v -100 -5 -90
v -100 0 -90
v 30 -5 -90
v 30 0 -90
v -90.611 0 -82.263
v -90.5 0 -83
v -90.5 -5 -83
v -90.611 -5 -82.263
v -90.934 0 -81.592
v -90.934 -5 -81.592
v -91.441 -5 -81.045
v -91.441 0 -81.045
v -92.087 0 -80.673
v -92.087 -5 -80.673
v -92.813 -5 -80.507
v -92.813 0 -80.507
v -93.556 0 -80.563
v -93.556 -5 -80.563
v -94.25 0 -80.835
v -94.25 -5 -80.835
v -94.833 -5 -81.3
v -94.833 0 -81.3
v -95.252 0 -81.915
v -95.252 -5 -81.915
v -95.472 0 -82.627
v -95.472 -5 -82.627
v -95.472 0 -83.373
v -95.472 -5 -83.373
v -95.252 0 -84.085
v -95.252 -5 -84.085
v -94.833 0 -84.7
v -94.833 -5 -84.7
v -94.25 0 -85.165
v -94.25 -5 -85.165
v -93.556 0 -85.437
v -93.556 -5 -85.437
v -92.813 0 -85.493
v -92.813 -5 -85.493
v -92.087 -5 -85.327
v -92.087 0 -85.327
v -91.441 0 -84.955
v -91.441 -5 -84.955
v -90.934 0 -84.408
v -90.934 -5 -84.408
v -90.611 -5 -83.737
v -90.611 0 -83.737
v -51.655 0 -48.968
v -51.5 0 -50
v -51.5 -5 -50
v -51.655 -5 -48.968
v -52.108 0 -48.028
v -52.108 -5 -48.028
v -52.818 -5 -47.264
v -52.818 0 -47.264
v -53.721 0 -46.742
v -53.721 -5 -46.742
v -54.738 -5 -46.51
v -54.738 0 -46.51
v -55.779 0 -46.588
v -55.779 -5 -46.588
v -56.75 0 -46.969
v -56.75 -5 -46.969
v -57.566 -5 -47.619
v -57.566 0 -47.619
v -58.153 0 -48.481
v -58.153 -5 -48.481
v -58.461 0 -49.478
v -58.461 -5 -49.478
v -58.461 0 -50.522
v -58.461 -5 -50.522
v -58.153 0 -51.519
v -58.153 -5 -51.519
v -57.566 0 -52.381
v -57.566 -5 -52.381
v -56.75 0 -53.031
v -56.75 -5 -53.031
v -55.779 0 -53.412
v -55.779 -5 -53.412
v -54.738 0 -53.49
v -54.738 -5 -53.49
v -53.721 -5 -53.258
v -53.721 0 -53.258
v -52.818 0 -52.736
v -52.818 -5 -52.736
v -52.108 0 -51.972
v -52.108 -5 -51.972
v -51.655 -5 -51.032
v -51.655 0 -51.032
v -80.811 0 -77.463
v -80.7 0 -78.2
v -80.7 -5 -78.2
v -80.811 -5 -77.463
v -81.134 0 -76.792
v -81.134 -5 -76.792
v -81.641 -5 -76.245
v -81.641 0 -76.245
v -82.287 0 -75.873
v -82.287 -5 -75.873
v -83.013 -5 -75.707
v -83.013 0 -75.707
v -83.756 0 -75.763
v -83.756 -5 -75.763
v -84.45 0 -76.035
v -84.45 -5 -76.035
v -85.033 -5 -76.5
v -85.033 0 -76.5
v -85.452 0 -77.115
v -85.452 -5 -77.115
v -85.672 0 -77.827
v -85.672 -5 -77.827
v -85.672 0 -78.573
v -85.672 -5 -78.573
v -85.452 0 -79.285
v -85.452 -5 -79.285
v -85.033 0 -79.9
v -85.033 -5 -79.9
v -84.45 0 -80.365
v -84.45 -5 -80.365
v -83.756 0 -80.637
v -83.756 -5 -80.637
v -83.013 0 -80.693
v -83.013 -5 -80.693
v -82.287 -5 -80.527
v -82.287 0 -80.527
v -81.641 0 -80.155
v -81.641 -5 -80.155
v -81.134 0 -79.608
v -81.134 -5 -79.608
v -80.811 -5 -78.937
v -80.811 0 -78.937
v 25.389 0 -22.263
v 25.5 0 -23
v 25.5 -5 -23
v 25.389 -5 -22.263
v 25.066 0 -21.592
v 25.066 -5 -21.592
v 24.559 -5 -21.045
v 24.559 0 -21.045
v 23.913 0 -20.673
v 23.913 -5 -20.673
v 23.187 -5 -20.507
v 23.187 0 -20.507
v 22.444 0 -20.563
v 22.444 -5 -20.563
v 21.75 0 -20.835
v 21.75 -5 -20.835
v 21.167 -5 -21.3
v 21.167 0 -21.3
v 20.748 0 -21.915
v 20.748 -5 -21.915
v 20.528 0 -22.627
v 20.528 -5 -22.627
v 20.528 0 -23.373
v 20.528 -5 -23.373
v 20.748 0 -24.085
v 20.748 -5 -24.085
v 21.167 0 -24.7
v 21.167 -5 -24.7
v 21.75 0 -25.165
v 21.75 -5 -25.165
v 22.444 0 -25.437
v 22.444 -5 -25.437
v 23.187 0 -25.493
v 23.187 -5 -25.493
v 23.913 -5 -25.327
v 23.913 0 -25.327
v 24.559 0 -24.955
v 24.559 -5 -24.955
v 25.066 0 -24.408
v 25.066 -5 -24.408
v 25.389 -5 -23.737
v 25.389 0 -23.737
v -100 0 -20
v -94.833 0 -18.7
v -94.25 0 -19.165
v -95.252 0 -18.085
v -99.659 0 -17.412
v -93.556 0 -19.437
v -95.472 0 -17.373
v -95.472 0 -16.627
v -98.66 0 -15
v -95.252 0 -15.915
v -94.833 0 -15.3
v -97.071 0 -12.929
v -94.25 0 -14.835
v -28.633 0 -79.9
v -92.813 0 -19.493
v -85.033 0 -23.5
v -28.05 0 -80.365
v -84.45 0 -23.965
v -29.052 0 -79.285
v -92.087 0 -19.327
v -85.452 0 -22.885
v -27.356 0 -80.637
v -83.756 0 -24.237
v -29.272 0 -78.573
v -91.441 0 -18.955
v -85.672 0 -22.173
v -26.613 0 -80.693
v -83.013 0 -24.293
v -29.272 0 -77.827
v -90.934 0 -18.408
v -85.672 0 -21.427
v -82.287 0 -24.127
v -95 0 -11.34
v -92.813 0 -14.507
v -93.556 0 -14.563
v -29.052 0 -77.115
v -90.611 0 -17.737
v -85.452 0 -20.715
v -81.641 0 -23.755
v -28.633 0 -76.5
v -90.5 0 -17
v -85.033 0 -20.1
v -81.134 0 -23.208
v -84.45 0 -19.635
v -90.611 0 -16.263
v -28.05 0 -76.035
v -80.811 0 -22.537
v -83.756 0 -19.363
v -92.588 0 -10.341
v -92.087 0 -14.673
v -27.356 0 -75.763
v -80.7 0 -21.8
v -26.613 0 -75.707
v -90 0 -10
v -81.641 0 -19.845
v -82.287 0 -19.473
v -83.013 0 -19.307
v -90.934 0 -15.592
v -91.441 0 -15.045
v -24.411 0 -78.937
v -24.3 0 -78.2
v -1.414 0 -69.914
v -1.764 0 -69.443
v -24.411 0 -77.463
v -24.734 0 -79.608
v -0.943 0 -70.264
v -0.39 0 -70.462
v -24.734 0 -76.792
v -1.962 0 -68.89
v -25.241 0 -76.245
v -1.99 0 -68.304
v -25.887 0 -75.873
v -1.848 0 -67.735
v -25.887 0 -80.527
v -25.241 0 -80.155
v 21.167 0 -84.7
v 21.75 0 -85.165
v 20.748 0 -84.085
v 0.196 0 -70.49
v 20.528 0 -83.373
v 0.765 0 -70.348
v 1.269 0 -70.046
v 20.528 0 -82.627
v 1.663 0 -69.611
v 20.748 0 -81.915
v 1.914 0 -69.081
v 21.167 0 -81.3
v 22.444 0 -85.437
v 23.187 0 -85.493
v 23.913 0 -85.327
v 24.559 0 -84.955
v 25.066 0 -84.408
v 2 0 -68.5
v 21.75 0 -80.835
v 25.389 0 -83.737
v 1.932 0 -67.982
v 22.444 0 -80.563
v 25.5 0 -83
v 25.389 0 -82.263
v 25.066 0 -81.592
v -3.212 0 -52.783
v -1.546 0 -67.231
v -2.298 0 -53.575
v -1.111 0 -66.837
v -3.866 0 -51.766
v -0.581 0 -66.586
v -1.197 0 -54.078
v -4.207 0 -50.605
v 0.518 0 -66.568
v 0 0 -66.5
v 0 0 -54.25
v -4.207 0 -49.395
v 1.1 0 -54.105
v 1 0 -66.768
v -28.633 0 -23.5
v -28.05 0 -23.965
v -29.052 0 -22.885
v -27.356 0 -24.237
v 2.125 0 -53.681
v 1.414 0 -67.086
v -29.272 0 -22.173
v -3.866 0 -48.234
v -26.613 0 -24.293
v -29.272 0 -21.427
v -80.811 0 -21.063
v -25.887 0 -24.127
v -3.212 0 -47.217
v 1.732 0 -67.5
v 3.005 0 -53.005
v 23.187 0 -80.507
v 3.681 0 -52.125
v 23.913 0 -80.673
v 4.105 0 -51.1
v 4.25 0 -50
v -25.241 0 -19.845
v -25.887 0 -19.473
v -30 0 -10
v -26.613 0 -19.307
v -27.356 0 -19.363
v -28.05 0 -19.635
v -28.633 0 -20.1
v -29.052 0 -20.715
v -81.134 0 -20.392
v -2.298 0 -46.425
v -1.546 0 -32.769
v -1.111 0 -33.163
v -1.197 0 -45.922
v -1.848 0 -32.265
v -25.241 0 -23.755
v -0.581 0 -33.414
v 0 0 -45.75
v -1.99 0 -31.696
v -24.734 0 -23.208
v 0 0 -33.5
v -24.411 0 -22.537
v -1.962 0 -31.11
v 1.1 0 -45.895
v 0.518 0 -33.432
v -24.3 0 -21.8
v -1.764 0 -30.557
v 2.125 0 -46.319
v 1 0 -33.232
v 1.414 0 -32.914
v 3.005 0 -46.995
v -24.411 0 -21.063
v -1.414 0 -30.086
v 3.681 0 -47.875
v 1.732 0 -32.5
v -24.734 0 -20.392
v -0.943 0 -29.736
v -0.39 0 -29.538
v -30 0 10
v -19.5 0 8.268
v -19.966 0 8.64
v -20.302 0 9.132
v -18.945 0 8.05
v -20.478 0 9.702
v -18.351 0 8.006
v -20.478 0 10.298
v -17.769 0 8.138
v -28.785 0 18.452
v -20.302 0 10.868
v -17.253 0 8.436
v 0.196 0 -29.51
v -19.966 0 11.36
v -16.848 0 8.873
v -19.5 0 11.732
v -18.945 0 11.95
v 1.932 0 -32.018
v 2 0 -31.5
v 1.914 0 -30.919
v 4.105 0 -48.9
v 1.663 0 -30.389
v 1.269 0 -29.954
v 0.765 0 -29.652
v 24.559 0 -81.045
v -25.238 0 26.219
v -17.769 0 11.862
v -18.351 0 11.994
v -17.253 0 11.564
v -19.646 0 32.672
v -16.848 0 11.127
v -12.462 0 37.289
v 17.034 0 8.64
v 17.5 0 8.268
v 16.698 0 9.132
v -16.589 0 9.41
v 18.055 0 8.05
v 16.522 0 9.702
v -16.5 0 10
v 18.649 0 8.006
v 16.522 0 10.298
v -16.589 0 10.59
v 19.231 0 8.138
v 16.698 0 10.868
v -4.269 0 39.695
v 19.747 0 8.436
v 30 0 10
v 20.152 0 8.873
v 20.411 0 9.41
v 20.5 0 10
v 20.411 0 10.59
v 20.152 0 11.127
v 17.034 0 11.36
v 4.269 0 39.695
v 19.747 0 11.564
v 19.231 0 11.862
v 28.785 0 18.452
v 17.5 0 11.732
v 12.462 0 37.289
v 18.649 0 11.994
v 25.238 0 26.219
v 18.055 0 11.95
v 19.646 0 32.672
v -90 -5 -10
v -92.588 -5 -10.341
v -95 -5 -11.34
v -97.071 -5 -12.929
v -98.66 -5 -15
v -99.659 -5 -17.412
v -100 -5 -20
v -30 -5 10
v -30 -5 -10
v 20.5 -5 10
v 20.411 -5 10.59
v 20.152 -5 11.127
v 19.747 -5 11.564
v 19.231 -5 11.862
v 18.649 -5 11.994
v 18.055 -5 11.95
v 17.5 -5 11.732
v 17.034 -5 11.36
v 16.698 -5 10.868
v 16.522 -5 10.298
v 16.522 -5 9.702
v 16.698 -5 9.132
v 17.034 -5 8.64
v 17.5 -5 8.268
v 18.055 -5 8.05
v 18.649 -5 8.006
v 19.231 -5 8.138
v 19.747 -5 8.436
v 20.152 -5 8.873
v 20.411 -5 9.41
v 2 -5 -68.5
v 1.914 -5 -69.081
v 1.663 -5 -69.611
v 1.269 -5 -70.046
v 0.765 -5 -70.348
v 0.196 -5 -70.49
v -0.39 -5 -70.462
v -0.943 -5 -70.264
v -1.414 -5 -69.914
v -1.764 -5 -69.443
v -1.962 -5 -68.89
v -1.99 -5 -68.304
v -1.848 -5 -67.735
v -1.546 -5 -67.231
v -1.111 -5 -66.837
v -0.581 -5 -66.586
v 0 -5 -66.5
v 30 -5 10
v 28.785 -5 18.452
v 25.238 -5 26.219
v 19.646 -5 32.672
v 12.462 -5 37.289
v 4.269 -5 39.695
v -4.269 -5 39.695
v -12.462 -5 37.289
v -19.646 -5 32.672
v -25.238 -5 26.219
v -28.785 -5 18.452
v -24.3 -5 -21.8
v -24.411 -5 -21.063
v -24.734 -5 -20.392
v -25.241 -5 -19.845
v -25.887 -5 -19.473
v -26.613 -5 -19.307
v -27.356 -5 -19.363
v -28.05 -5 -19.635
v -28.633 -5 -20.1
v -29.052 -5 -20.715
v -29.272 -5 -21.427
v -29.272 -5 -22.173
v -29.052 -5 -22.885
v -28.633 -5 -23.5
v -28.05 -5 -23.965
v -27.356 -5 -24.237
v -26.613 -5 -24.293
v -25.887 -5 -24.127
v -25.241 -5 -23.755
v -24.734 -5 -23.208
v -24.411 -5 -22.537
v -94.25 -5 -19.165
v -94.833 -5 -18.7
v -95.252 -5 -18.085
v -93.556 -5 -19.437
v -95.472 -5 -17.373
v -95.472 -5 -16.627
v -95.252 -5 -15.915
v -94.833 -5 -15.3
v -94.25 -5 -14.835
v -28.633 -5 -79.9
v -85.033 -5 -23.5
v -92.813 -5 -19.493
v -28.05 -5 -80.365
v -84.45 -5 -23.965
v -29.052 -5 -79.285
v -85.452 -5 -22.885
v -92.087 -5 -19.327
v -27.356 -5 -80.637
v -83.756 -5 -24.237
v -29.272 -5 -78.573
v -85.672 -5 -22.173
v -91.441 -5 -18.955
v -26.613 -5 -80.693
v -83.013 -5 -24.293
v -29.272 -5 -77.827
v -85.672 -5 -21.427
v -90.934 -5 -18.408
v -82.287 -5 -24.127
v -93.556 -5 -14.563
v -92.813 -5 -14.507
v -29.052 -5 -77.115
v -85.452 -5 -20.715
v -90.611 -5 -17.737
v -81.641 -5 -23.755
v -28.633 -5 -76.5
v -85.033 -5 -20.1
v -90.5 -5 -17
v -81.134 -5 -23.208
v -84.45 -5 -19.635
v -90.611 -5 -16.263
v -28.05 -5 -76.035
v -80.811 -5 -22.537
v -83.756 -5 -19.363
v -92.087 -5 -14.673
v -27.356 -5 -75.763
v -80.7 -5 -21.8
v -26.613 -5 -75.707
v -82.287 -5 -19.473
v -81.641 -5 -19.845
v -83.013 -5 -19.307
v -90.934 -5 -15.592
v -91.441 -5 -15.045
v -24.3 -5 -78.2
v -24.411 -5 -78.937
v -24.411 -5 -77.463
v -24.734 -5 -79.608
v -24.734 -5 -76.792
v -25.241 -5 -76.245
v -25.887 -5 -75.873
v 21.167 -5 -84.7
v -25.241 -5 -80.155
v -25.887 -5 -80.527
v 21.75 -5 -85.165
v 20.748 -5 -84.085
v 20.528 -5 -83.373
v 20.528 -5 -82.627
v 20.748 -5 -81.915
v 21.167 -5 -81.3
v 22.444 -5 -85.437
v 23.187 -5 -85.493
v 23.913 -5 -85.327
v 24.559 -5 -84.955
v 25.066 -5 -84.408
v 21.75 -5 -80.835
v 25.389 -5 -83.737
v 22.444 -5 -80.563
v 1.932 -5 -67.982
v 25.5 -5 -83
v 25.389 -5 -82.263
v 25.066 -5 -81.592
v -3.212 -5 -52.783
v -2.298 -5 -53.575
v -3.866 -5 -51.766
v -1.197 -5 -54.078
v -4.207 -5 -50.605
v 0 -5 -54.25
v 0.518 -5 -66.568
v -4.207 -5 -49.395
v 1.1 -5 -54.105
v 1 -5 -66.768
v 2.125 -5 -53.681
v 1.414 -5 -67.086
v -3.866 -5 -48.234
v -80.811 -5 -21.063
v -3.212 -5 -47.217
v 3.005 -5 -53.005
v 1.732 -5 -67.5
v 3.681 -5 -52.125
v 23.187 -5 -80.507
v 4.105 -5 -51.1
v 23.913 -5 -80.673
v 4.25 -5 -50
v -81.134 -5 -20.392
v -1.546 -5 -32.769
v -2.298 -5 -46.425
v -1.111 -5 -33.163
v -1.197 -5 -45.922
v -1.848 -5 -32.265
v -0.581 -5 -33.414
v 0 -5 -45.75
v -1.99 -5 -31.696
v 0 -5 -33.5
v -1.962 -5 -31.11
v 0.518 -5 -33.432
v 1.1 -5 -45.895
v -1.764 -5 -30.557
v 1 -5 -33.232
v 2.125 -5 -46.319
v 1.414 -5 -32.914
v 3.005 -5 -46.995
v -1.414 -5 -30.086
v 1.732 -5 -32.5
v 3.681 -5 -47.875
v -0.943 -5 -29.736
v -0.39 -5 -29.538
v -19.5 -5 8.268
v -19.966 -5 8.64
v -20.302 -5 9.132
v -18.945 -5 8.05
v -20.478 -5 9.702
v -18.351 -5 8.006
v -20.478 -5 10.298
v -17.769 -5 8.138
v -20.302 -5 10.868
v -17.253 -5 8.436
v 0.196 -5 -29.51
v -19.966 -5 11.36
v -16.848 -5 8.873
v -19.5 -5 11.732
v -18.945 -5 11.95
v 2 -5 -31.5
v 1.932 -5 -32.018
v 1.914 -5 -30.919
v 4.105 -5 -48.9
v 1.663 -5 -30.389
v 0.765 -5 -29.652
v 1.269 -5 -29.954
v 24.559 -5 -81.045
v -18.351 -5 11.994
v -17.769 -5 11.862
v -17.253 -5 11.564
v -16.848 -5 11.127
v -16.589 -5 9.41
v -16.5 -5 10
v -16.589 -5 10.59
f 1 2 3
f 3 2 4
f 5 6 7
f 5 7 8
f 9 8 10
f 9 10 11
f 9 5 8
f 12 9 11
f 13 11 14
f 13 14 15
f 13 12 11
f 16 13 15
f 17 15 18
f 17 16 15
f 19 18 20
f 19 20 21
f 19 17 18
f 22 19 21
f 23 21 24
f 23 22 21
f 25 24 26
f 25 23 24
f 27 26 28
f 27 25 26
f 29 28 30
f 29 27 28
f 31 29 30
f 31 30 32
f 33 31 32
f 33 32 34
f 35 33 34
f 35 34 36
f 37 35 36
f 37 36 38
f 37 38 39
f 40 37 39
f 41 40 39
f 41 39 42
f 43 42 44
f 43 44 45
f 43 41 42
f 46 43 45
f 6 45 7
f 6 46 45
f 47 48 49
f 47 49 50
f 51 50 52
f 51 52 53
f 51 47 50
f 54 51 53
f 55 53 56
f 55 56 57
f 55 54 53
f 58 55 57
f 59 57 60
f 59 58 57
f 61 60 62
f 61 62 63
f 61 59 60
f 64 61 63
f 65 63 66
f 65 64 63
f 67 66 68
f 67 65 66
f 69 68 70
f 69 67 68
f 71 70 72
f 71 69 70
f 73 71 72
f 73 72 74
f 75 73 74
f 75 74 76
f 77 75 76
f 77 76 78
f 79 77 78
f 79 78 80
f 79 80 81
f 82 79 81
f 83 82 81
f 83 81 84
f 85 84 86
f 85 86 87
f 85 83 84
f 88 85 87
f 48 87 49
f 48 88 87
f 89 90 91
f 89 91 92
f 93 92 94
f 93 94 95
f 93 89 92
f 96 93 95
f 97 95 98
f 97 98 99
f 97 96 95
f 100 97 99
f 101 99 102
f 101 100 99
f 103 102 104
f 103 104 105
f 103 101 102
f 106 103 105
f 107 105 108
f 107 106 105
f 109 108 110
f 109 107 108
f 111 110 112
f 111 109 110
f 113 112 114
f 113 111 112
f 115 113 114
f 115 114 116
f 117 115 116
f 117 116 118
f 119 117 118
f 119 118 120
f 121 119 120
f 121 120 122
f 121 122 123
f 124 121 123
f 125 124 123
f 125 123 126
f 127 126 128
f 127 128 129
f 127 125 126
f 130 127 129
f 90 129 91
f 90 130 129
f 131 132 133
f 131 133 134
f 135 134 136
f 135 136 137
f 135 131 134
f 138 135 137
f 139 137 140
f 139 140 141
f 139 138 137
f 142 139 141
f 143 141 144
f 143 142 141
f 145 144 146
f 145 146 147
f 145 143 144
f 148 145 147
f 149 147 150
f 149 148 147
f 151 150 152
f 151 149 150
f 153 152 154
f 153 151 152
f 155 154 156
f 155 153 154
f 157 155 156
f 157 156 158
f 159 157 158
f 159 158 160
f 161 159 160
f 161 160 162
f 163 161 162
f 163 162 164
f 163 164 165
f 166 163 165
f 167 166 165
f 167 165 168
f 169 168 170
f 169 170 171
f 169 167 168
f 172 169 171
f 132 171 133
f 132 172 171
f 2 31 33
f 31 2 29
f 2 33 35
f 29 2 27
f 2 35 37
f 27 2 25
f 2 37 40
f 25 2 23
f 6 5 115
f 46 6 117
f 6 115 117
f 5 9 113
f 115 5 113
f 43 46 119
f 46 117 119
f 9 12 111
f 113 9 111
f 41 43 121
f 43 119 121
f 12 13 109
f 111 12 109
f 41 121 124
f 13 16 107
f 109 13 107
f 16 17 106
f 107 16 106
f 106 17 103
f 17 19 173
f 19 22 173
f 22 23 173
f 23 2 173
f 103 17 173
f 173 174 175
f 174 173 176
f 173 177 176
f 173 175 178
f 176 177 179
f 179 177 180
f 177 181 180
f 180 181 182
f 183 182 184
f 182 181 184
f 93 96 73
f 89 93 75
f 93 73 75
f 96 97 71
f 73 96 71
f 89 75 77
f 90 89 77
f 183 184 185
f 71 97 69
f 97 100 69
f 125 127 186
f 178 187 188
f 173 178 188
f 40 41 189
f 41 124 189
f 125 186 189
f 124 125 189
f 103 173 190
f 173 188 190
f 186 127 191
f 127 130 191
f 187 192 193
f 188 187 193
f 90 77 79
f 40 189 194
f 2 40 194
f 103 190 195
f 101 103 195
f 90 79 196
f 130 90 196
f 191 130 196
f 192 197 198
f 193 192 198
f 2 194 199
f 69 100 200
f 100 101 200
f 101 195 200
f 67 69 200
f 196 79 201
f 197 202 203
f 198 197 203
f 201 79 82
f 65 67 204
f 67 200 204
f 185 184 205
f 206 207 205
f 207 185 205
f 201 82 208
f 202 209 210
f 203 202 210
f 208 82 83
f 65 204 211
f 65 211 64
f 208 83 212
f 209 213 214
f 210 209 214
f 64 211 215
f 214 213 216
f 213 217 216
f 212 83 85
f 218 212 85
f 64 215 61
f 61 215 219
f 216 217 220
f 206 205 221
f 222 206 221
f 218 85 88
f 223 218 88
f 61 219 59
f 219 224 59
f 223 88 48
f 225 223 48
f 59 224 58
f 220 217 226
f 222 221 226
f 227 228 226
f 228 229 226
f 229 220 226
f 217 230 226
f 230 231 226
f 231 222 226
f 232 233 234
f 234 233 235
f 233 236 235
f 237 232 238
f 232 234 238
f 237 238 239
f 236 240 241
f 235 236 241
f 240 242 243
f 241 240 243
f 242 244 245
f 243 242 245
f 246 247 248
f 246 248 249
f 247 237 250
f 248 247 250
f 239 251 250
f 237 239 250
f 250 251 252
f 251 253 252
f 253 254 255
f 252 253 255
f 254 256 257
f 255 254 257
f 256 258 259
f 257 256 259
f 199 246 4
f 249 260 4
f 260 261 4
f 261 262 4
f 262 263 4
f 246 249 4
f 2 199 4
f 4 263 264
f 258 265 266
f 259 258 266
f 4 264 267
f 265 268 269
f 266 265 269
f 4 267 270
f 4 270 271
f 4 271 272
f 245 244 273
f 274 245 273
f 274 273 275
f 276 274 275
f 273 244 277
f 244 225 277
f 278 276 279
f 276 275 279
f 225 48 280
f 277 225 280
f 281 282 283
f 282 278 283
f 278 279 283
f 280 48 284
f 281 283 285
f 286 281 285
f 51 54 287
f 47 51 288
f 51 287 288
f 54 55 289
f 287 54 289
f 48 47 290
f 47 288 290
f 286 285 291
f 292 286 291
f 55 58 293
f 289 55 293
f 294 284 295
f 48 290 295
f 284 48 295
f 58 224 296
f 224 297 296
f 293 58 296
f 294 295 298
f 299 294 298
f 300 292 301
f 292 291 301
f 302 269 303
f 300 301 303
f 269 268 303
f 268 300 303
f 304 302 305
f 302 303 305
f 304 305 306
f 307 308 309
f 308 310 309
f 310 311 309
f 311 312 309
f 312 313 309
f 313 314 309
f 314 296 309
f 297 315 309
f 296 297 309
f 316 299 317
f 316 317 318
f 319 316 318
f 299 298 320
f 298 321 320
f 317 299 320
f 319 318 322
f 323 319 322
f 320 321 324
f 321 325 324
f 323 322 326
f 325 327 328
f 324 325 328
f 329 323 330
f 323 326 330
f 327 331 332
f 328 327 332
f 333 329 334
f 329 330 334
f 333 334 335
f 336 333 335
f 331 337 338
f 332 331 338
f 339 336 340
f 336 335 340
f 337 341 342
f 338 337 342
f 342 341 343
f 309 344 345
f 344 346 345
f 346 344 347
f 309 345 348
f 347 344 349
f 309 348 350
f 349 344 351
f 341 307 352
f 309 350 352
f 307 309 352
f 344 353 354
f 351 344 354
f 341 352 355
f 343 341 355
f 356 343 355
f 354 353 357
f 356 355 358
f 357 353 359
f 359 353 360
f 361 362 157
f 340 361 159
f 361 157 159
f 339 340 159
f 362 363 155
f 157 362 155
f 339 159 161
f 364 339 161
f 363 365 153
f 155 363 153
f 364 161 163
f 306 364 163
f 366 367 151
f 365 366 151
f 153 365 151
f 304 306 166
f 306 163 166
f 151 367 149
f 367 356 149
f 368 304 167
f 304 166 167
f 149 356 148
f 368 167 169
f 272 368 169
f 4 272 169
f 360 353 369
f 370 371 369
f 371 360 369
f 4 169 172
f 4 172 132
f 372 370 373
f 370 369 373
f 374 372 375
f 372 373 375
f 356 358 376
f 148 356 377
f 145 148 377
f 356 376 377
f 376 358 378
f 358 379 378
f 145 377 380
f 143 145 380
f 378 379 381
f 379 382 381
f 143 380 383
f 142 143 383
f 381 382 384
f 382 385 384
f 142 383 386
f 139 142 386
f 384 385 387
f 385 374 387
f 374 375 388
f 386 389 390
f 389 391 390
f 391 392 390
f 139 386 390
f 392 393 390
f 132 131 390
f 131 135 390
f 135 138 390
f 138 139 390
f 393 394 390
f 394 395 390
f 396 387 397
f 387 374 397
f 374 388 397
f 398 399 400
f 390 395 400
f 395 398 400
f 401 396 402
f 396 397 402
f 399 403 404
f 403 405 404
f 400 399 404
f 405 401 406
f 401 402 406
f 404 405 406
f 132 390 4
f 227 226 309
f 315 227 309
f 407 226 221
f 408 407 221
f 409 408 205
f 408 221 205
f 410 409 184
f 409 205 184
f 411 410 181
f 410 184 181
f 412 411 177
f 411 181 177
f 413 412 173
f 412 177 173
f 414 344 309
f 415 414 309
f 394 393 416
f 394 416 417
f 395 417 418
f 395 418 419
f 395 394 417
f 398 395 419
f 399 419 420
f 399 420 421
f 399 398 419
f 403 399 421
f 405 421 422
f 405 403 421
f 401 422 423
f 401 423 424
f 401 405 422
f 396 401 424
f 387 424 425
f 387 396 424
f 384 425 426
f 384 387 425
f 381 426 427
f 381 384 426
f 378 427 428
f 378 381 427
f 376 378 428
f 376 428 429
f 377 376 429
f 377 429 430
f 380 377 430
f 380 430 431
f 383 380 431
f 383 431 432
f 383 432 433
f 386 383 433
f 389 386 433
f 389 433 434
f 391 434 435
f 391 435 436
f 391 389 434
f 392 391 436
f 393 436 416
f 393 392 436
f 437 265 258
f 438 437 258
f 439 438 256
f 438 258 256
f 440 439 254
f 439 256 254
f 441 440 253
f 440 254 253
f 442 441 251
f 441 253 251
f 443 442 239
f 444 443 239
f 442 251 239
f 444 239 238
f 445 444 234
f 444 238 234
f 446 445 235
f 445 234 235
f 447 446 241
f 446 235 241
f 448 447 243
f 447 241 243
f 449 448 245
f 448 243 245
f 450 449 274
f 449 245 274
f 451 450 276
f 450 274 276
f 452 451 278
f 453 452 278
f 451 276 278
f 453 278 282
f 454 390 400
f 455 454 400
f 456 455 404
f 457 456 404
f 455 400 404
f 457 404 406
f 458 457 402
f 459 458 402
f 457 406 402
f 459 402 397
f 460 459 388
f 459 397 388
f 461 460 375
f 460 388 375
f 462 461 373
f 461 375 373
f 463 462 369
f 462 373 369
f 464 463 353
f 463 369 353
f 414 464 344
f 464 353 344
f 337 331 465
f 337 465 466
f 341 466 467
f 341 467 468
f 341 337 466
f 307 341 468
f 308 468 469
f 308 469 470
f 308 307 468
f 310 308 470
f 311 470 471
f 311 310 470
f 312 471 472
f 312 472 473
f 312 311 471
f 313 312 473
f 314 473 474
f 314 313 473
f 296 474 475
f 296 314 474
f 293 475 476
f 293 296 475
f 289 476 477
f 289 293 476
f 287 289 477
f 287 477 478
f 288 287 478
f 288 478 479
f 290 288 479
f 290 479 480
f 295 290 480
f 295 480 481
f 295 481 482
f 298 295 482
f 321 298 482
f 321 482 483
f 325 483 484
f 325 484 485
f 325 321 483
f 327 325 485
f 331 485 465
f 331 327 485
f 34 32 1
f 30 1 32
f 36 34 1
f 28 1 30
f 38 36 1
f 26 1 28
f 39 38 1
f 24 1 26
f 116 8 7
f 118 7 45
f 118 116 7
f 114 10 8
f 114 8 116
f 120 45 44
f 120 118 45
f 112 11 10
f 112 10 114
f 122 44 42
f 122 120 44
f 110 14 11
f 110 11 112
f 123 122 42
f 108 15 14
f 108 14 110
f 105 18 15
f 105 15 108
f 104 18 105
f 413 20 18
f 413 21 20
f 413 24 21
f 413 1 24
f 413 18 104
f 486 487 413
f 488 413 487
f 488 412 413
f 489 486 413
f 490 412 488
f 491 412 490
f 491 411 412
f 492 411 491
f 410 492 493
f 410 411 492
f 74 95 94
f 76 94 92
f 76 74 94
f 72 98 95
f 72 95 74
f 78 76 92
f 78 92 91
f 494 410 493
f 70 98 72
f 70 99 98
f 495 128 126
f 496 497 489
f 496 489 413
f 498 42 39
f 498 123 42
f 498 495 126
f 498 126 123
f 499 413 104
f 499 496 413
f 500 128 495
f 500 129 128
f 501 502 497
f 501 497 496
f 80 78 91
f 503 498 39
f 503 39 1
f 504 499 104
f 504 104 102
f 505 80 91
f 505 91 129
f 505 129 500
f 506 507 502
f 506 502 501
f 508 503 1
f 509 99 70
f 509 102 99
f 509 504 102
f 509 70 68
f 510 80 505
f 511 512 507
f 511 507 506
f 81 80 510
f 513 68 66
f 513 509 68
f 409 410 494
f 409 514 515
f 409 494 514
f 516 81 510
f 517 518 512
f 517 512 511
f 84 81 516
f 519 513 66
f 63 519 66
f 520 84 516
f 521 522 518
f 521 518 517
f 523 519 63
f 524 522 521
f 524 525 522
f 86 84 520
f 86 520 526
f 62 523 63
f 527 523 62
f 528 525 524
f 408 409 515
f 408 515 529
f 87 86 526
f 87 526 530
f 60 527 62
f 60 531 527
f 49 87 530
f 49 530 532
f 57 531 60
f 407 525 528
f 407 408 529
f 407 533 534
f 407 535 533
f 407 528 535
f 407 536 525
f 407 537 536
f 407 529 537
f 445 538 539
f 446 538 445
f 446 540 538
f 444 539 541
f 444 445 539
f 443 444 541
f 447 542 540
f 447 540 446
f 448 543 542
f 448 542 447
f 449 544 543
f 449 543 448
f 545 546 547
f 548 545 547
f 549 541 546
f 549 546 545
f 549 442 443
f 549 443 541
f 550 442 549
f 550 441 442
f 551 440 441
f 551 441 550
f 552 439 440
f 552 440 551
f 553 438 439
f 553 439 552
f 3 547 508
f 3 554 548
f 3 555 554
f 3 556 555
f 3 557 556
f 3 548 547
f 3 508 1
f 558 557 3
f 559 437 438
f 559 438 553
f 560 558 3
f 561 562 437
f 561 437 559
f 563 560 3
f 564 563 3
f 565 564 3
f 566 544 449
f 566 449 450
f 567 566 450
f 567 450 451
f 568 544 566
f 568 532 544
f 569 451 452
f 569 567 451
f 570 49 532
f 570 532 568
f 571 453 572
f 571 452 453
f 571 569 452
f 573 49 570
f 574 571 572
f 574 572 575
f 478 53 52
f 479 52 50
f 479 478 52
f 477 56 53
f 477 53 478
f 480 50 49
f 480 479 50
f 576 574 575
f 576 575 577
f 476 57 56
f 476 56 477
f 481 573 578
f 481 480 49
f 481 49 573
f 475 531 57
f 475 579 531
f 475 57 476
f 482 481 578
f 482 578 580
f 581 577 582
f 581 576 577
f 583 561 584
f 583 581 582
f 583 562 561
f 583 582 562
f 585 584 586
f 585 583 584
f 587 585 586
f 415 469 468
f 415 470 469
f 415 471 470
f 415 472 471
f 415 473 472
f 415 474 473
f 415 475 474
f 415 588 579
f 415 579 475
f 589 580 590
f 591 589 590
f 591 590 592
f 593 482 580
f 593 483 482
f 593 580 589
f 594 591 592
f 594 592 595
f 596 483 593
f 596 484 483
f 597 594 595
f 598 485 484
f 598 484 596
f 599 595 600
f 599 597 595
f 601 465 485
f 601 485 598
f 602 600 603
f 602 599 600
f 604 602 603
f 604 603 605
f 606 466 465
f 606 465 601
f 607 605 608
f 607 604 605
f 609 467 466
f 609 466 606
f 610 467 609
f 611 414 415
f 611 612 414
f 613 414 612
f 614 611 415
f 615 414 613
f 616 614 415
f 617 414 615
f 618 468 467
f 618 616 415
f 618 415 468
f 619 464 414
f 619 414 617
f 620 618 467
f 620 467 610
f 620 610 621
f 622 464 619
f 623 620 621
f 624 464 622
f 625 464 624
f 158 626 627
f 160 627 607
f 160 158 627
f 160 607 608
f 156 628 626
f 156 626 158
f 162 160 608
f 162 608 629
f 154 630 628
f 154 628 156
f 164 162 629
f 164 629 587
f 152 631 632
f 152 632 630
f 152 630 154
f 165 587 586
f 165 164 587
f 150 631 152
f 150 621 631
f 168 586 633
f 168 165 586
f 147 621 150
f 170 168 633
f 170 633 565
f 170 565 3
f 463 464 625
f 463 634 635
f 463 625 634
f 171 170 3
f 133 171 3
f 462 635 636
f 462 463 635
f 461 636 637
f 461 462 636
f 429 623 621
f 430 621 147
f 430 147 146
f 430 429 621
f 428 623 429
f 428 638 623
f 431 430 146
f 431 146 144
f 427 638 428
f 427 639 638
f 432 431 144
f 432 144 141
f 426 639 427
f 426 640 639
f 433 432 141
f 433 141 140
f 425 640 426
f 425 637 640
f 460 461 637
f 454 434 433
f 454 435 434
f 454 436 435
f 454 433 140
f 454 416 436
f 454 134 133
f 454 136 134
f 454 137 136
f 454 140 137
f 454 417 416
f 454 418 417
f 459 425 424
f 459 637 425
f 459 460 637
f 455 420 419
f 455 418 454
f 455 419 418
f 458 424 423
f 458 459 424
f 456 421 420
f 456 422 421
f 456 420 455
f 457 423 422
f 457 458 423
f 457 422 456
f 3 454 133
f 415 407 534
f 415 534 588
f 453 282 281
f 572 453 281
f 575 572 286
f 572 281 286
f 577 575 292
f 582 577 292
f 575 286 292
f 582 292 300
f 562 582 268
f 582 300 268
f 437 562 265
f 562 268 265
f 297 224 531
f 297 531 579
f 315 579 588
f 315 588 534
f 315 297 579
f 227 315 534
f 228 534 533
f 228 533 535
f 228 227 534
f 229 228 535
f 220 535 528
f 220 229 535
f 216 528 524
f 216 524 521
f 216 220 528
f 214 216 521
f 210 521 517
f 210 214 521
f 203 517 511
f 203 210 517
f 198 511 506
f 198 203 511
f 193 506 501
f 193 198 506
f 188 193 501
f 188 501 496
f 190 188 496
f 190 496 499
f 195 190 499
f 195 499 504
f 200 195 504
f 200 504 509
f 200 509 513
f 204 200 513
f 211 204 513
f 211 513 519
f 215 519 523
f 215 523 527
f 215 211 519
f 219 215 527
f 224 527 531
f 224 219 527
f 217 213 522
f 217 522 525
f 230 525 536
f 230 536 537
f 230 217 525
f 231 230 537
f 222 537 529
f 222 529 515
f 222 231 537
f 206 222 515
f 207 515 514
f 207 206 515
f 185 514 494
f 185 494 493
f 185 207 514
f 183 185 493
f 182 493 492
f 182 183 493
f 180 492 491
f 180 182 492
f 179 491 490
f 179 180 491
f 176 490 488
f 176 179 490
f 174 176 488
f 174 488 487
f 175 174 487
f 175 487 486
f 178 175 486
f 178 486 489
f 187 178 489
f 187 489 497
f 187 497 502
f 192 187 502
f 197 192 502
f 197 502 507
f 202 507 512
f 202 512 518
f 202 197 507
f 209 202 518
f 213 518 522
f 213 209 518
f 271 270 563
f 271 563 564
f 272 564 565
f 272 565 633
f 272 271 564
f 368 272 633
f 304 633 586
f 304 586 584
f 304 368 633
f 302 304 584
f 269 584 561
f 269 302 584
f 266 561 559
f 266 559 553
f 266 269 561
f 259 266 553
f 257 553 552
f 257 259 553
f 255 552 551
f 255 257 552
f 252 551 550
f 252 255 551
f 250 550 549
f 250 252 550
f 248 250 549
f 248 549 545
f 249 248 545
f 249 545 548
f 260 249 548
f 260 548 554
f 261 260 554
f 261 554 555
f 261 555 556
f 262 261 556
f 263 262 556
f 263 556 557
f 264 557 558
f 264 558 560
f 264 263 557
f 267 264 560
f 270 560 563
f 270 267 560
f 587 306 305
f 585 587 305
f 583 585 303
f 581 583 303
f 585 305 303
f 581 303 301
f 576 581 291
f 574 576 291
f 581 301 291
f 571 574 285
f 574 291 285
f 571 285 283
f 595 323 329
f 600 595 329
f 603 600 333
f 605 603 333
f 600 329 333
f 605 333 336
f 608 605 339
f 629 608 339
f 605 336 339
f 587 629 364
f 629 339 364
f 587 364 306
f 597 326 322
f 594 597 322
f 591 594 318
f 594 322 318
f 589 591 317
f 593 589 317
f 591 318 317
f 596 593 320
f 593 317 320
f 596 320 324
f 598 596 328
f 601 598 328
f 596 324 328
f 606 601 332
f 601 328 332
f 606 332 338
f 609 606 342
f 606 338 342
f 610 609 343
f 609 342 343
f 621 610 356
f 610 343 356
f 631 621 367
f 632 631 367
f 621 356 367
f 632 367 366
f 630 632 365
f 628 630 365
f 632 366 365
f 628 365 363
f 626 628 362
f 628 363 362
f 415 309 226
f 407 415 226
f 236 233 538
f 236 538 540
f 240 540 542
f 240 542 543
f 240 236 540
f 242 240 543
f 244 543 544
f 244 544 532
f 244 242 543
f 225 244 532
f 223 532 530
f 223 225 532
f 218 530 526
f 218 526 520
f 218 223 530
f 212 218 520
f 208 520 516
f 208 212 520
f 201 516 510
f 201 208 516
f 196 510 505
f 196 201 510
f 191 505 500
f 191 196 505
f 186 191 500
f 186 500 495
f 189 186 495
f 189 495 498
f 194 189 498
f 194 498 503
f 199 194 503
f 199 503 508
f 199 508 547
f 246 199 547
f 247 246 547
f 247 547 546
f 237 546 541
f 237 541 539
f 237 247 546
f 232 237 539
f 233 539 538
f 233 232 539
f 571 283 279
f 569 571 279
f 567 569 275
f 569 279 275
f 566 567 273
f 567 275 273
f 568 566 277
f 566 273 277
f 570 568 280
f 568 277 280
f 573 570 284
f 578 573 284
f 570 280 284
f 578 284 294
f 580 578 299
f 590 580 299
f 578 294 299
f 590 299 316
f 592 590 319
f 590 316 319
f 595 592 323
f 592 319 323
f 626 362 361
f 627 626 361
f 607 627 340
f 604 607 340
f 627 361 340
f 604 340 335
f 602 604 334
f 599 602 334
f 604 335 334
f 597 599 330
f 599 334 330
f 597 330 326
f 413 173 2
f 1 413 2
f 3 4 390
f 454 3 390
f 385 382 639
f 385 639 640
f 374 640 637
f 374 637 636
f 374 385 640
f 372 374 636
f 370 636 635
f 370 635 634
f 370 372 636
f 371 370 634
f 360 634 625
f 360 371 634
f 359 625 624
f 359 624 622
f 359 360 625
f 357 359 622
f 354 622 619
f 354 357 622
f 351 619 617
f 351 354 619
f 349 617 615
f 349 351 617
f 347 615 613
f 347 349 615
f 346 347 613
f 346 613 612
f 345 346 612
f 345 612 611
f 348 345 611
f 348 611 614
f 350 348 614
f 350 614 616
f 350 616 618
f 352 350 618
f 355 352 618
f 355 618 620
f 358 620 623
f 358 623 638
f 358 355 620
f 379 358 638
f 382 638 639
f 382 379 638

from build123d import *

# Parameters (mm, degrees)
F0_R     = 2.5
F0_R_2   = 3.5
F0_R_3   = 2
F1_DEPTH = 5


with BuildPart() as f1:
    # F0 (on Front) → F1 (new body)
    with BuildSketch(Plane.XZ):
        with BuildLine():
            Line((-100, -90), (30, -90))
            Line((30, -90), (30, 10))
            ThreePointArc((30, 10), (0, 40), (-30, 10))
            Line((-30, 10), (-30, -10))
            Line((-30, -10), (-90, -10))
            ThreePointArc((-90, -10), (-97.071068, -12.928932), (-100, -20))
            Line((-100, -20), (-100, -90))
        make_face()
        with Locations((-93, -83)):
            Circle(F0_R, mode=Mode.SUBTRACT)
        with Locations((-83.2, -78.2)):
            Circle(F0_R, mode=Mode.SUBTRACT)
        with Locations((-55, -50)):
            Circle(F0_R_2, mode=Mode.SUBTRACT)
        with Locations((-26.8, -78.2)):
            Circle(F0_R, mode=Mode.SUBTRACT)
        with Locations((23, -83)):
            Circle(F0_R, mode=Mode.SUBTRACT)
        with BuildLine():
            ThreePointArc((2, -68.5), (-1.414214, -69.914214), (0, -66.5))
            ThreePointArc((0, -66.5), (1.414214, -67.085786), (2, -68.5))
        make_face(mode=Mode.SUBTRACT)
        with BuildLine():
            ThreePointArc((0, -54.25), (-4.25, -50), (0, -45.75))
            ThreePointArc((0, -45.75), (3.005204, -46.994796), (4.25, -50))
            ThreePointArc((4.25, -50), (3.005204, -53.005204), (0, -54.25))
        make_face(mode=Mode.SUBTRACT)
        with BuildLine():
            ThreePointArc((0, -33.5), (-1.414214, -30.085786), (2, -31.5))
            ThreePointArc((2, -31.5), (1.414214, -32.914214), (0, -33.5))
        make_face(mode=Mode.SUBTRACT)
        with Locations((-93, -17)):
            Circle(F0_R, mode=Mode.SUBTRACT)
        with Locations((-83.2, -21.8)):
            Circle(F0_R, mode=Mode.SUBTRACT)
        with Locations((-26.8, -21.8)):
            Circle(F0_R, mode=Mode.SUBTRACT)
        with Locations((23, -23)):
            Circle(F0_R, mode=Mode.SUBTRACT)
        with Locations((-18.5, 10)):
            Circle(F0_R_3, mode=Mode.SUBTRACT)
        with Locations((18.5, 10)):
            Circle(F0_R_3, mode=Mode.SUBTRACT)
    extrude(amount=F1_DEPTH)


solid = f1.part
